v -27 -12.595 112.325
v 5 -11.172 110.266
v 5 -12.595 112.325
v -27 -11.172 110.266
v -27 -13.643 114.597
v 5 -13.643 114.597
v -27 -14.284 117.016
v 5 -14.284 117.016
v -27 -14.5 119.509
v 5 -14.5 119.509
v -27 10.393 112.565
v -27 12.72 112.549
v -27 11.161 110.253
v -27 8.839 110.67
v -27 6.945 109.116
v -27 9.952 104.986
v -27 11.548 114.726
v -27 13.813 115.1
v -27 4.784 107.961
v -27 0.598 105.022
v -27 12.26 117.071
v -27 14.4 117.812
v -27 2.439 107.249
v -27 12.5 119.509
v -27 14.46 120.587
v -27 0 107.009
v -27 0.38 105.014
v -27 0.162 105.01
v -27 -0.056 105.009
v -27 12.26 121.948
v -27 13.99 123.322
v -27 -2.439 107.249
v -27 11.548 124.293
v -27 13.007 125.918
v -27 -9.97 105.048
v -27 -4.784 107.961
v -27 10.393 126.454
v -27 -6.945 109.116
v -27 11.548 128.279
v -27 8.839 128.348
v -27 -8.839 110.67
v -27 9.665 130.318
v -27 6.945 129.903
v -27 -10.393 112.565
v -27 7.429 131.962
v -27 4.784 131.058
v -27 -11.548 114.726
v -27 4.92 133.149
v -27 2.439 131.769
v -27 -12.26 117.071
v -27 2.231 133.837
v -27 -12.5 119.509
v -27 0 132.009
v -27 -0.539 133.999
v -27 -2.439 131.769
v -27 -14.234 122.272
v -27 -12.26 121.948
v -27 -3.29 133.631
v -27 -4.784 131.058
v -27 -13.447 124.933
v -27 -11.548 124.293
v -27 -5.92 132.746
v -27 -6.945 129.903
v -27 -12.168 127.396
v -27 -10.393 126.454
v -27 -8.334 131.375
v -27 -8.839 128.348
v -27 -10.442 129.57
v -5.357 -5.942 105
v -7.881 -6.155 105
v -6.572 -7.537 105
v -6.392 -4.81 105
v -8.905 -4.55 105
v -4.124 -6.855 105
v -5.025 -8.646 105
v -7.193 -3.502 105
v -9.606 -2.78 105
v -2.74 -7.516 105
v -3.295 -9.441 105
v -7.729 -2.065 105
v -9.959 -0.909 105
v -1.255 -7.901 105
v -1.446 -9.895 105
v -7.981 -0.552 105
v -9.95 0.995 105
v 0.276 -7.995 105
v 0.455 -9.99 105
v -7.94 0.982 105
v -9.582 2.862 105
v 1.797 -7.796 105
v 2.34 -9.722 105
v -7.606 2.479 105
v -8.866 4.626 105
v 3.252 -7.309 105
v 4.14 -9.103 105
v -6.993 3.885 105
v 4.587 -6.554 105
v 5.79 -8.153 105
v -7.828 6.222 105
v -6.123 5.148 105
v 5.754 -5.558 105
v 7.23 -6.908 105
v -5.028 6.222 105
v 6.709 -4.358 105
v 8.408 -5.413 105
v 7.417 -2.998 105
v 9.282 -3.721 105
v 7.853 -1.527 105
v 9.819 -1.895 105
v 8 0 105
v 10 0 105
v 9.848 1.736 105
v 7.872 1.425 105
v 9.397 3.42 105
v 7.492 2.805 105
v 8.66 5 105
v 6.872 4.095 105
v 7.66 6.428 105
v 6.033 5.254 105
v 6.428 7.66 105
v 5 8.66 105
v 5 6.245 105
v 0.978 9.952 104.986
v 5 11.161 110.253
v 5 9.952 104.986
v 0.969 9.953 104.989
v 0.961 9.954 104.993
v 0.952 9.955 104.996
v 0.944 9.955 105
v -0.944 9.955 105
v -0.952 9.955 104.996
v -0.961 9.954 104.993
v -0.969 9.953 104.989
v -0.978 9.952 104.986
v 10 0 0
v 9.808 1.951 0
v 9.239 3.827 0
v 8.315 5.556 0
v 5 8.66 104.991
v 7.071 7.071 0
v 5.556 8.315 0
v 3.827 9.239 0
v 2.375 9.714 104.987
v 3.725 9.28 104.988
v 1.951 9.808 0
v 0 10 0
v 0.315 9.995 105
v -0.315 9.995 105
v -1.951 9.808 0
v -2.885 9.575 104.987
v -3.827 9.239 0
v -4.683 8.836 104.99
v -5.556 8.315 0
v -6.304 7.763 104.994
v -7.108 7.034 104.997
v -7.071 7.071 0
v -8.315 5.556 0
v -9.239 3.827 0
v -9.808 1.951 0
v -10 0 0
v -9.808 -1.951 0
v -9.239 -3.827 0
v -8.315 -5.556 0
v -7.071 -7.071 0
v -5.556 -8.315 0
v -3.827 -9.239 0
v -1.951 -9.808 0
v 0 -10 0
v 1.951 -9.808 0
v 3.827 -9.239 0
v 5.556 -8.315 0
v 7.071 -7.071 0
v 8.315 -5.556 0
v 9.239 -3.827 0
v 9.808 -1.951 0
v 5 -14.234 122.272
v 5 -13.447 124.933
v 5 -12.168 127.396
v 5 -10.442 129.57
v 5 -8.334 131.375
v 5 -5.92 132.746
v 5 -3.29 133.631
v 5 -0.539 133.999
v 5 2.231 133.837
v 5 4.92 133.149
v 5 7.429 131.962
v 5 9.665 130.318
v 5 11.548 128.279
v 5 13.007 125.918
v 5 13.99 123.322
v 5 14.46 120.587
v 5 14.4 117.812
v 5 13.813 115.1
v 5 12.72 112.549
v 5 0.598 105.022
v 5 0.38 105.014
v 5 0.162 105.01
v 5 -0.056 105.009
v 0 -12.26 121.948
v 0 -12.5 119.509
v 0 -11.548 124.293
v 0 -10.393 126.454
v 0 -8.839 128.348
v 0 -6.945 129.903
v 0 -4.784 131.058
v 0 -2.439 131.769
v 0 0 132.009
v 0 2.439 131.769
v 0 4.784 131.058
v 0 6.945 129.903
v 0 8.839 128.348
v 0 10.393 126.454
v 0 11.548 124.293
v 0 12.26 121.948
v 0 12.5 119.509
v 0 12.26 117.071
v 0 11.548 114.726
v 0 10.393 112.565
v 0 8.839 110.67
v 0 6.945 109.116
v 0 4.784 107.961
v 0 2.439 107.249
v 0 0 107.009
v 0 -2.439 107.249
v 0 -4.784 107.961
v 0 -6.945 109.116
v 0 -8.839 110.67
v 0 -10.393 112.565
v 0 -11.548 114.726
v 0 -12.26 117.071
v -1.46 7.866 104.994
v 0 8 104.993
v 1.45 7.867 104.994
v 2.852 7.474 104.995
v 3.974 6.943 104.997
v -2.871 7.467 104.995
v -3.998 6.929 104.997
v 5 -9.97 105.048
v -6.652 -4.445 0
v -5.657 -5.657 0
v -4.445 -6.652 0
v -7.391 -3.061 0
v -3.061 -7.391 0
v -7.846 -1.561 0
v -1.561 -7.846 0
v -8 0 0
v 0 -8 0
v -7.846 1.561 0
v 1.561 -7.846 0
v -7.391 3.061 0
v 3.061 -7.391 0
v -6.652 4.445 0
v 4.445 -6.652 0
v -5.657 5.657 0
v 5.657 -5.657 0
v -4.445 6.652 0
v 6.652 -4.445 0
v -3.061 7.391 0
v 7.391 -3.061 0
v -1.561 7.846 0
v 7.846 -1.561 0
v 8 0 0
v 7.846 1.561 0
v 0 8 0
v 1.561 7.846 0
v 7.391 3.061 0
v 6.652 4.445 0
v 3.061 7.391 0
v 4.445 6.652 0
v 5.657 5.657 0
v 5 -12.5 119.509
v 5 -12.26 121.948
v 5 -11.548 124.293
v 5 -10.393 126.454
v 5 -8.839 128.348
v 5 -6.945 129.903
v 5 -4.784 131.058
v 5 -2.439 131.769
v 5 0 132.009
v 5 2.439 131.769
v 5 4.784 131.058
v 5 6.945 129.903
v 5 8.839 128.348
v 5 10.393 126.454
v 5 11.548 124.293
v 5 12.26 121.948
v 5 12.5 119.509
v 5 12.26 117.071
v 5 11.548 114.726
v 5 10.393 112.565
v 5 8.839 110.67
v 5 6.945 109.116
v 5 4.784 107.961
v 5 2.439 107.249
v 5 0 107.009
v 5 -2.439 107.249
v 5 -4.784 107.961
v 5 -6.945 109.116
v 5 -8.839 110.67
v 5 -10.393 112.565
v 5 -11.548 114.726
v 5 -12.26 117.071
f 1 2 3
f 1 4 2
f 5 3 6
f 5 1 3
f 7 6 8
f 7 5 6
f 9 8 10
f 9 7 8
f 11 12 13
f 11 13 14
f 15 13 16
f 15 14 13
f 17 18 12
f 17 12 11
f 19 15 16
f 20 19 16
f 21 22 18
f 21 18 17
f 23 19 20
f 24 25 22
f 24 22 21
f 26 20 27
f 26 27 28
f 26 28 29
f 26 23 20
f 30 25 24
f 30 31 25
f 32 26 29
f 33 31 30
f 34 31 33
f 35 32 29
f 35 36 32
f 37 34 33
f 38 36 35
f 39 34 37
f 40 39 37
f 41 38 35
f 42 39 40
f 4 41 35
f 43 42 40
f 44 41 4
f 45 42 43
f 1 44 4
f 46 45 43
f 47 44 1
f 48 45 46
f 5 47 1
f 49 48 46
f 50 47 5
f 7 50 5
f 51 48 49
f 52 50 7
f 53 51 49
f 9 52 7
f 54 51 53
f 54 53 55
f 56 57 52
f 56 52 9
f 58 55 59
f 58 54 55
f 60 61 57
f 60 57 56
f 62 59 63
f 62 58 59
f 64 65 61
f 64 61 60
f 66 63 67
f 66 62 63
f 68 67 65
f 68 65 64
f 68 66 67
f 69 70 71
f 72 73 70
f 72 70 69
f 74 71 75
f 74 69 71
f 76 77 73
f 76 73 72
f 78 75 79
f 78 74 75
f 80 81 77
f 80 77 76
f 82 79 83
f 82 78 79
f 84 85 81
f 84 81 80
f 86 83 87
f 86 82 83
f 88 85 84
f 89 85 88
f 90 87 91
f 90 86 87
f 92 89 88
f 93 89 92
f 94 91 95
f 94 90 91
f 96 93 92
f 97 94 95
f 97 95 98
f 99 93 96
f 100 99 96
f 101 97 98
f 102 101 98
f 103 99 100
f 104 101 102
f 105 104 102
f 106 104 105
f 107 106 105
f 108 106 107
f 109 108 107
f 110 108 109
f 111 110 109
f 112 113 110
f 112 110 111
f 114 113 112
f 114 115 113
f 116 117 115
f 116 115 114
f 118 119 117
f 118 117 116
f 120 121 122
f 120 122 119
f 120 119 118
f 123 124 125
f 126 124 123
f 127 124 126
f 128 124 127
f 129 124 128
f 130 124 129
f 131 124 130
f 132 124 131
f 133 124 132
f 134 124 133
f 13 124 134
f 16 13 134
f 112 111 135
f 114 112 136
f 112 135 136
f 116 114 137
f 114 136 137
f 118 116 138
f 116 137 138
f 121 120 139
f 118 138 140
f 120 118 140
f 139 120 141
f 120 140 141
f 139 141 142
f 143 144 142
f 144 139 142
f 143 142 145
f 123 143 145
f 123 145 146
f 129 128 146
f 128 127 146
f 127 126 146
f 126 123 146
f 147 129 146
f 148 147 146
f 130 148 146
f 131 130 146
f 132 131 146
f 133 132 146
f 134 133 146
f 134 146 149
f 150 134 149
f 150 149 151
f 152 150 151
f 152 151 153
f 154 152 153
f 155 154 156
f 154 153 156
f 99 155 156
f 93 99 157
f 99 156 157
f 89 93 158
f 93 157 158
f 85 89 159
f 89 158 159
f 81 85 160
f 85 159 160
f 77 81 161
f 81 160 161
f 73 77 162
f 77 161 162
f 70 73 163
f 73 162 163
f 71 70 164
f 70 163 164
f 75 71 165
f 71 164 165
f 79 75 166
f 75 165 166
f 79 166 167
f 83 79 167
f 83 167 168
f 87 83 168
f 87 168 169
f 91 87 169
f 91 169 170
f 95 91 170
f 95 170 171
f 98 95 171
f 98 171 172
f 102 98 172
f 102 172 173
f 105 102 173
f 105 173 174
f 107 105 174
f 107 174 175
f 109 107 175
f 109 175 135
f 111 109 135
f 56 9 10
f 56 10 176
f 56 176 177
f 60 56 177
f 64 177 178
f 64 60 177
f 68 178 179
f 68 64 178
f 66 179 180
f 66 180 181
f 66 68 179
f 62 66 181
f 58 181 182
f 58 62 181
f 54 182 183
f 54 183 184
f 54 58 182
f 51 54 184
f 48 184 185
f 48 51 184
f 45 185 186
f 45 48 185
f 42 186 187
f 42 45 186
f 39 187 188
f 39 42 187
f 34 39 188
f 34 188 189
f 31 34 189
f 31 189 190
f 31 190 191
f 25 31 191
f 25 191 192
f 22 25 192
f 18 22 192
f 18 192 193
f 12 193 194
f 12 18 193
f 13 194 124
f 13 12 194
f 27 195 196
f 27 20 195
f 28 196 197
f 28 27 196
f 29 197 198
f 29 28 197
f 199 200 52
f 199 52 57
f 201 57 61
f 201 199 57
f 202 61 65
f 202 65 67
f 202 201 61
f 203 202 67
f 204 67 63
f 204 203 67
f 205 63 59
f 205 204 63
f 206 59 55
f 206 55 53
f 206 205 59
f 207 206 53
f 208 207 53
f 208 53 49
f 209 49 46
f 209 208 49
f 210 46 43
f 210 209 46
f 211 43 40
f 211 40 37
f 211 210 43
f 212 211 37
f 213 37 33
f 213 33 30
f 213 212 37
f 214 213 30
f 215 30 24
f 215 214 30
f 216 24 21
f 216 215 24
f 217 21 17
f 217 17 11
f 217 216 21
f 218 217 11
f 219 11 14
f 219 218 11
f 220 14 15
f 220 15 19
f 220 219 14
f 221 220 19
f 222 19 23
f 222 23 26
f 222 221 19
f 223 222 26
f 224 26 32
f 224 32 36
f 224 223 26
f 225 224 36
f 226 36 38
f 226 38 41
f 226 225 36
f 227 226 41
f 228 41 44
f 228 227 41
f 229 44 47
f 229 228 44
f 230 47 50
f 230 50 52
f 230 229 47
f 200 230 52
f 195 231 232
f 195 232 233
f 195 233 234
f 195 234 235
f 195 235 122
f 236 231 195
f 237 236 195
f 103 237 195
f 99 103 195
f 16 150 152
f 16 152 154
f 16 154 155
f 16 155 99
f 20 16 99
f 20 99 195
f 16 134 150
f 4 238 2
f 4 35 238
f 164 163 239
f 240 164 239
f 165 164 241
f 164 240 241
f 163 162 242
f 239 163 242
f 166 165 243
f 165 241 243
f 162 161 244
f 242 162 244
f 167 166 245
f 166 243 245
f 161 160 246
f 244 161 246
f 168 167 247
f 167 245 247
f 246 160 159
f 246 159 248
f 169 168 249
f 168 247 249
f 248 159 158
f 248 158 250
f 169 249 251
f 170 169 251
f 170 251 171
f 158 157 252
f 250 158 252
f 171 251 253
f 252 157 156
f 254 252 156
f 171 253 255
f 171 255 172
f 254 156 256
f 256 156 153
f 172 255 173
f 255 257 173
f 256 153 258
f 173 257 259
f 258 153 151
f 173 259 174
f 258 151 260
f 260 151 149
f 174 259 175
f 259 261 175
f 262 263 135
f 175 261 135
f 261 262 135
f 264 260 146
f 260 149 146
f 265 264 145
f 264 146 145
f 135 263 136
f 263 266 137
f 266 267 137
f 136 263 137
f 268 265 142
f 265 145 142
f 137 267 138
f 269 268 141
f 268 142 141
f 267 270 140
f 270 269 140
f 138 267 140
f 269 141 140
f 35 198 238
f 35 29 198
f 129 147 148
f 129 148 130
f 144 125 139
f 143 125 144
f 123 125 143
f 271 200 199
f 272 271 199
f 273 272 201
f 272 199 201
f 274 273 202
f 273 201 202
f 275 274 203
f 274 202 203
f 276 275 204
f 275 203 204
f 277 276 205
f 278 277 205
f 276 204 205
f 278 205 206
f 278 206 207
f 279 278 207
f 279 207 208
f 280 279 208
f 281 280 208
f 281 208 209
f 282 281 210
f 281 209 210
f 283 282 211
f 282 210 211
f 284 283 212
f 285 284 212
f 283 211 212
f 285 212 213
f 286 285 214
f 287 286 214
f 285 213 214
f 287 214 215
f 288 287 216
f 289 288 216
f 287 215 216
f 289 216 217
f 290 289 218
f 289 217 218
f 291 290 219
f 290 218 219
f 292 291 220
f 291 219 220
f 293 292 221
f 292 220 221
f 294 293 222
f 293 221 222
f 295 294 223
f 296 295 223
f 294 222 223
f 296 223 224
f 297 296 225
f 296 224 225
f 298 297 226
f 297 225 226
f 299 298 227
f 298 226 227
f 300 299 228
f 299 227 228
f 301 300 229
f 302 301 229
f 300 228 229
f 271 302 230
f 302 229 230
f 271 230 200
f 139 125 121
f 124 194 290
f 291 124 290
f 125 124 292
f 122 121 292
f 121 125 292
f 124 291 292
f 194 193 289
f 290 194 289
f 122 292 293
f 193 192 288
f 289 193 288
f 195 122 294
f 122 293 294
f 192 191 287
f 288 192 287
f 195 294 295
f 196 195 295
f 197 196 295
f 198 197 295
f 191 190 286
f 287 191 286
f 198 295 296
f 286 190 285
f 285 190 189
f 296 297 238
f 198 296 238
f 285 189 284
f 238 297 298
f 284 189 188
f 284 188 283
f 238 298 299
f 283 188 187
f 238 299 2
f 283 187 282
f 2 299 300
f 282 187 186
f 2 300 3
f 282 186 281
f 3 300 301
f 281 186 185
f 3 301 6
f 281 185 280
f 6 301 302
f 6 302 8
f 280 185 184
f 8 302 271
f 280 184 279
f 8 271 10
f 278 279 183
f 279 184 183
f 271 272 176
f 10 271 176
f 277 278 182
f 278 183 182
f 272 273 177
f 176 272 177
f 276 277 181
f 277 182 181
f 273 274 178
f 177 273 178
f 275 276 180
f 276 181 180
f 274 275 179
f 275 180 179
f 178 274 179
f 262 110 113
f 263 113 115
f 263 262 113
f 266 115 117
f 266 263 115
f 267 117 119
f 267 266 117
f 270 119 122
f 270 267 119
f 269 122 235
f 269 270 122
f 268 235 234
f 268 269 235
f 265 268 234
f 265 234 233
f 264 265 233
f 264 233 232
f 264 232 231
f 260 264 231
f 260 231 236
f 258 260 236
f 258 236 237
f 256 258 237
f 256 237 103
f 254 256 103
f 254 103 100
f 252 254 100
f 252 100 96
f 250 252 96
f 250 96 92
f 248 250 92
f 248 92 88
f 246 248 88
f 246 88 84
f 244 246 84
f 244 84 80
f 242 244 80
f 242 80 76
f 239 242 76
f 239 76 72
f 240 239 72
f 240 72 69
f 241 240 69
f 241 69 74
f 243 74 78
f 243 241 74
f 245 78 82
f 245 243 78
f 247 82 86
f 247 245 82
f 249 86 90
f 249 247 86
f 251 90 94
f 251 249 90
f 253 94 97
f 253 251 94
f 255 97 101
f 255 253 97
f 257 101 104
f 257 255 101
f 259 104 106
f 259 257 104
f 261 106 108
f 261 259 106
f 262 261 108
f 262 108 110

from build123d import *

# Parameters (mm, degrees)
F0_R          = 10
F0_R_2        = 8
F1_DEPTH      = 105
F3_R          = 12.5
F4_DEPTH      = 27
F4_DEPTH_BACK = 5


with BuildPart() as f1:
    # F0 (on Top) → F1 (new body)
    with BuildSketch(Plane.XY):
        Circle(F0_R)
        Circle(F0_R_2, mode=Mode.SUBTRACT)
    extrude(amount=F1_DEPTH)

    # F3 (on face) → F4 (join, two sides)
    with BuildSketch(Plane(origin=(0, 0, 0), x_dir=(0, -1, 0), z_dir=(-1, 0, 0))) as f4_sk:
        with BuildLine():
            ThreePointArc((11.172051, 110.266167), (13.642667, 114.5973), (14.5, 119.509288))
            ThreePointArc((14.5, 119.509288), (-4.920183, 133.149002), (-11.160938, 110.252752))
            ThreePointArc((-11.160938, 110.252752), (-6.435198, 106.515512), (-0.598424, 105.021642))
            ThreePointArc((-0.598424, 105.021642), (-0.271382, 105.011828), (0.055797, 105.009396))
            ThreePointArc((0.055797, 105.009396), (6.198754, 106.401068), (11.172051, 110.266167))
        make_face()
        with Locations((0, 119.509288)):
            Circle(F3_R, mode=Mode.SUBTRACT)
        with BuildLine():
            ThreePointArc((-0.598424, 105.021642), (-6.435198, 106.515512), (-11.160938, 110.252752))
            Line((-11.160938, 110.252752), (-9.952081, 104.985648))
            Line((-9.952081, 104.985648), (-0.598424, 105.021642))
        make_face()
        with BuildLine():
            Line((9.969966, 105.047546), (11.172051, 110.266167))
            ThreePointArc((11.172051, 110.266167), (6.198754, 106.401068), (0.055797, 105.009396))
            Line((0.055797, 105.009396), (9.969966, 105.047546))
        make_face()
    extrude(amount=F4_DEPTH)
    extrude(f4_sk.sketch, amount=-F4_DEPTH_BACK)


solid = f1.part
